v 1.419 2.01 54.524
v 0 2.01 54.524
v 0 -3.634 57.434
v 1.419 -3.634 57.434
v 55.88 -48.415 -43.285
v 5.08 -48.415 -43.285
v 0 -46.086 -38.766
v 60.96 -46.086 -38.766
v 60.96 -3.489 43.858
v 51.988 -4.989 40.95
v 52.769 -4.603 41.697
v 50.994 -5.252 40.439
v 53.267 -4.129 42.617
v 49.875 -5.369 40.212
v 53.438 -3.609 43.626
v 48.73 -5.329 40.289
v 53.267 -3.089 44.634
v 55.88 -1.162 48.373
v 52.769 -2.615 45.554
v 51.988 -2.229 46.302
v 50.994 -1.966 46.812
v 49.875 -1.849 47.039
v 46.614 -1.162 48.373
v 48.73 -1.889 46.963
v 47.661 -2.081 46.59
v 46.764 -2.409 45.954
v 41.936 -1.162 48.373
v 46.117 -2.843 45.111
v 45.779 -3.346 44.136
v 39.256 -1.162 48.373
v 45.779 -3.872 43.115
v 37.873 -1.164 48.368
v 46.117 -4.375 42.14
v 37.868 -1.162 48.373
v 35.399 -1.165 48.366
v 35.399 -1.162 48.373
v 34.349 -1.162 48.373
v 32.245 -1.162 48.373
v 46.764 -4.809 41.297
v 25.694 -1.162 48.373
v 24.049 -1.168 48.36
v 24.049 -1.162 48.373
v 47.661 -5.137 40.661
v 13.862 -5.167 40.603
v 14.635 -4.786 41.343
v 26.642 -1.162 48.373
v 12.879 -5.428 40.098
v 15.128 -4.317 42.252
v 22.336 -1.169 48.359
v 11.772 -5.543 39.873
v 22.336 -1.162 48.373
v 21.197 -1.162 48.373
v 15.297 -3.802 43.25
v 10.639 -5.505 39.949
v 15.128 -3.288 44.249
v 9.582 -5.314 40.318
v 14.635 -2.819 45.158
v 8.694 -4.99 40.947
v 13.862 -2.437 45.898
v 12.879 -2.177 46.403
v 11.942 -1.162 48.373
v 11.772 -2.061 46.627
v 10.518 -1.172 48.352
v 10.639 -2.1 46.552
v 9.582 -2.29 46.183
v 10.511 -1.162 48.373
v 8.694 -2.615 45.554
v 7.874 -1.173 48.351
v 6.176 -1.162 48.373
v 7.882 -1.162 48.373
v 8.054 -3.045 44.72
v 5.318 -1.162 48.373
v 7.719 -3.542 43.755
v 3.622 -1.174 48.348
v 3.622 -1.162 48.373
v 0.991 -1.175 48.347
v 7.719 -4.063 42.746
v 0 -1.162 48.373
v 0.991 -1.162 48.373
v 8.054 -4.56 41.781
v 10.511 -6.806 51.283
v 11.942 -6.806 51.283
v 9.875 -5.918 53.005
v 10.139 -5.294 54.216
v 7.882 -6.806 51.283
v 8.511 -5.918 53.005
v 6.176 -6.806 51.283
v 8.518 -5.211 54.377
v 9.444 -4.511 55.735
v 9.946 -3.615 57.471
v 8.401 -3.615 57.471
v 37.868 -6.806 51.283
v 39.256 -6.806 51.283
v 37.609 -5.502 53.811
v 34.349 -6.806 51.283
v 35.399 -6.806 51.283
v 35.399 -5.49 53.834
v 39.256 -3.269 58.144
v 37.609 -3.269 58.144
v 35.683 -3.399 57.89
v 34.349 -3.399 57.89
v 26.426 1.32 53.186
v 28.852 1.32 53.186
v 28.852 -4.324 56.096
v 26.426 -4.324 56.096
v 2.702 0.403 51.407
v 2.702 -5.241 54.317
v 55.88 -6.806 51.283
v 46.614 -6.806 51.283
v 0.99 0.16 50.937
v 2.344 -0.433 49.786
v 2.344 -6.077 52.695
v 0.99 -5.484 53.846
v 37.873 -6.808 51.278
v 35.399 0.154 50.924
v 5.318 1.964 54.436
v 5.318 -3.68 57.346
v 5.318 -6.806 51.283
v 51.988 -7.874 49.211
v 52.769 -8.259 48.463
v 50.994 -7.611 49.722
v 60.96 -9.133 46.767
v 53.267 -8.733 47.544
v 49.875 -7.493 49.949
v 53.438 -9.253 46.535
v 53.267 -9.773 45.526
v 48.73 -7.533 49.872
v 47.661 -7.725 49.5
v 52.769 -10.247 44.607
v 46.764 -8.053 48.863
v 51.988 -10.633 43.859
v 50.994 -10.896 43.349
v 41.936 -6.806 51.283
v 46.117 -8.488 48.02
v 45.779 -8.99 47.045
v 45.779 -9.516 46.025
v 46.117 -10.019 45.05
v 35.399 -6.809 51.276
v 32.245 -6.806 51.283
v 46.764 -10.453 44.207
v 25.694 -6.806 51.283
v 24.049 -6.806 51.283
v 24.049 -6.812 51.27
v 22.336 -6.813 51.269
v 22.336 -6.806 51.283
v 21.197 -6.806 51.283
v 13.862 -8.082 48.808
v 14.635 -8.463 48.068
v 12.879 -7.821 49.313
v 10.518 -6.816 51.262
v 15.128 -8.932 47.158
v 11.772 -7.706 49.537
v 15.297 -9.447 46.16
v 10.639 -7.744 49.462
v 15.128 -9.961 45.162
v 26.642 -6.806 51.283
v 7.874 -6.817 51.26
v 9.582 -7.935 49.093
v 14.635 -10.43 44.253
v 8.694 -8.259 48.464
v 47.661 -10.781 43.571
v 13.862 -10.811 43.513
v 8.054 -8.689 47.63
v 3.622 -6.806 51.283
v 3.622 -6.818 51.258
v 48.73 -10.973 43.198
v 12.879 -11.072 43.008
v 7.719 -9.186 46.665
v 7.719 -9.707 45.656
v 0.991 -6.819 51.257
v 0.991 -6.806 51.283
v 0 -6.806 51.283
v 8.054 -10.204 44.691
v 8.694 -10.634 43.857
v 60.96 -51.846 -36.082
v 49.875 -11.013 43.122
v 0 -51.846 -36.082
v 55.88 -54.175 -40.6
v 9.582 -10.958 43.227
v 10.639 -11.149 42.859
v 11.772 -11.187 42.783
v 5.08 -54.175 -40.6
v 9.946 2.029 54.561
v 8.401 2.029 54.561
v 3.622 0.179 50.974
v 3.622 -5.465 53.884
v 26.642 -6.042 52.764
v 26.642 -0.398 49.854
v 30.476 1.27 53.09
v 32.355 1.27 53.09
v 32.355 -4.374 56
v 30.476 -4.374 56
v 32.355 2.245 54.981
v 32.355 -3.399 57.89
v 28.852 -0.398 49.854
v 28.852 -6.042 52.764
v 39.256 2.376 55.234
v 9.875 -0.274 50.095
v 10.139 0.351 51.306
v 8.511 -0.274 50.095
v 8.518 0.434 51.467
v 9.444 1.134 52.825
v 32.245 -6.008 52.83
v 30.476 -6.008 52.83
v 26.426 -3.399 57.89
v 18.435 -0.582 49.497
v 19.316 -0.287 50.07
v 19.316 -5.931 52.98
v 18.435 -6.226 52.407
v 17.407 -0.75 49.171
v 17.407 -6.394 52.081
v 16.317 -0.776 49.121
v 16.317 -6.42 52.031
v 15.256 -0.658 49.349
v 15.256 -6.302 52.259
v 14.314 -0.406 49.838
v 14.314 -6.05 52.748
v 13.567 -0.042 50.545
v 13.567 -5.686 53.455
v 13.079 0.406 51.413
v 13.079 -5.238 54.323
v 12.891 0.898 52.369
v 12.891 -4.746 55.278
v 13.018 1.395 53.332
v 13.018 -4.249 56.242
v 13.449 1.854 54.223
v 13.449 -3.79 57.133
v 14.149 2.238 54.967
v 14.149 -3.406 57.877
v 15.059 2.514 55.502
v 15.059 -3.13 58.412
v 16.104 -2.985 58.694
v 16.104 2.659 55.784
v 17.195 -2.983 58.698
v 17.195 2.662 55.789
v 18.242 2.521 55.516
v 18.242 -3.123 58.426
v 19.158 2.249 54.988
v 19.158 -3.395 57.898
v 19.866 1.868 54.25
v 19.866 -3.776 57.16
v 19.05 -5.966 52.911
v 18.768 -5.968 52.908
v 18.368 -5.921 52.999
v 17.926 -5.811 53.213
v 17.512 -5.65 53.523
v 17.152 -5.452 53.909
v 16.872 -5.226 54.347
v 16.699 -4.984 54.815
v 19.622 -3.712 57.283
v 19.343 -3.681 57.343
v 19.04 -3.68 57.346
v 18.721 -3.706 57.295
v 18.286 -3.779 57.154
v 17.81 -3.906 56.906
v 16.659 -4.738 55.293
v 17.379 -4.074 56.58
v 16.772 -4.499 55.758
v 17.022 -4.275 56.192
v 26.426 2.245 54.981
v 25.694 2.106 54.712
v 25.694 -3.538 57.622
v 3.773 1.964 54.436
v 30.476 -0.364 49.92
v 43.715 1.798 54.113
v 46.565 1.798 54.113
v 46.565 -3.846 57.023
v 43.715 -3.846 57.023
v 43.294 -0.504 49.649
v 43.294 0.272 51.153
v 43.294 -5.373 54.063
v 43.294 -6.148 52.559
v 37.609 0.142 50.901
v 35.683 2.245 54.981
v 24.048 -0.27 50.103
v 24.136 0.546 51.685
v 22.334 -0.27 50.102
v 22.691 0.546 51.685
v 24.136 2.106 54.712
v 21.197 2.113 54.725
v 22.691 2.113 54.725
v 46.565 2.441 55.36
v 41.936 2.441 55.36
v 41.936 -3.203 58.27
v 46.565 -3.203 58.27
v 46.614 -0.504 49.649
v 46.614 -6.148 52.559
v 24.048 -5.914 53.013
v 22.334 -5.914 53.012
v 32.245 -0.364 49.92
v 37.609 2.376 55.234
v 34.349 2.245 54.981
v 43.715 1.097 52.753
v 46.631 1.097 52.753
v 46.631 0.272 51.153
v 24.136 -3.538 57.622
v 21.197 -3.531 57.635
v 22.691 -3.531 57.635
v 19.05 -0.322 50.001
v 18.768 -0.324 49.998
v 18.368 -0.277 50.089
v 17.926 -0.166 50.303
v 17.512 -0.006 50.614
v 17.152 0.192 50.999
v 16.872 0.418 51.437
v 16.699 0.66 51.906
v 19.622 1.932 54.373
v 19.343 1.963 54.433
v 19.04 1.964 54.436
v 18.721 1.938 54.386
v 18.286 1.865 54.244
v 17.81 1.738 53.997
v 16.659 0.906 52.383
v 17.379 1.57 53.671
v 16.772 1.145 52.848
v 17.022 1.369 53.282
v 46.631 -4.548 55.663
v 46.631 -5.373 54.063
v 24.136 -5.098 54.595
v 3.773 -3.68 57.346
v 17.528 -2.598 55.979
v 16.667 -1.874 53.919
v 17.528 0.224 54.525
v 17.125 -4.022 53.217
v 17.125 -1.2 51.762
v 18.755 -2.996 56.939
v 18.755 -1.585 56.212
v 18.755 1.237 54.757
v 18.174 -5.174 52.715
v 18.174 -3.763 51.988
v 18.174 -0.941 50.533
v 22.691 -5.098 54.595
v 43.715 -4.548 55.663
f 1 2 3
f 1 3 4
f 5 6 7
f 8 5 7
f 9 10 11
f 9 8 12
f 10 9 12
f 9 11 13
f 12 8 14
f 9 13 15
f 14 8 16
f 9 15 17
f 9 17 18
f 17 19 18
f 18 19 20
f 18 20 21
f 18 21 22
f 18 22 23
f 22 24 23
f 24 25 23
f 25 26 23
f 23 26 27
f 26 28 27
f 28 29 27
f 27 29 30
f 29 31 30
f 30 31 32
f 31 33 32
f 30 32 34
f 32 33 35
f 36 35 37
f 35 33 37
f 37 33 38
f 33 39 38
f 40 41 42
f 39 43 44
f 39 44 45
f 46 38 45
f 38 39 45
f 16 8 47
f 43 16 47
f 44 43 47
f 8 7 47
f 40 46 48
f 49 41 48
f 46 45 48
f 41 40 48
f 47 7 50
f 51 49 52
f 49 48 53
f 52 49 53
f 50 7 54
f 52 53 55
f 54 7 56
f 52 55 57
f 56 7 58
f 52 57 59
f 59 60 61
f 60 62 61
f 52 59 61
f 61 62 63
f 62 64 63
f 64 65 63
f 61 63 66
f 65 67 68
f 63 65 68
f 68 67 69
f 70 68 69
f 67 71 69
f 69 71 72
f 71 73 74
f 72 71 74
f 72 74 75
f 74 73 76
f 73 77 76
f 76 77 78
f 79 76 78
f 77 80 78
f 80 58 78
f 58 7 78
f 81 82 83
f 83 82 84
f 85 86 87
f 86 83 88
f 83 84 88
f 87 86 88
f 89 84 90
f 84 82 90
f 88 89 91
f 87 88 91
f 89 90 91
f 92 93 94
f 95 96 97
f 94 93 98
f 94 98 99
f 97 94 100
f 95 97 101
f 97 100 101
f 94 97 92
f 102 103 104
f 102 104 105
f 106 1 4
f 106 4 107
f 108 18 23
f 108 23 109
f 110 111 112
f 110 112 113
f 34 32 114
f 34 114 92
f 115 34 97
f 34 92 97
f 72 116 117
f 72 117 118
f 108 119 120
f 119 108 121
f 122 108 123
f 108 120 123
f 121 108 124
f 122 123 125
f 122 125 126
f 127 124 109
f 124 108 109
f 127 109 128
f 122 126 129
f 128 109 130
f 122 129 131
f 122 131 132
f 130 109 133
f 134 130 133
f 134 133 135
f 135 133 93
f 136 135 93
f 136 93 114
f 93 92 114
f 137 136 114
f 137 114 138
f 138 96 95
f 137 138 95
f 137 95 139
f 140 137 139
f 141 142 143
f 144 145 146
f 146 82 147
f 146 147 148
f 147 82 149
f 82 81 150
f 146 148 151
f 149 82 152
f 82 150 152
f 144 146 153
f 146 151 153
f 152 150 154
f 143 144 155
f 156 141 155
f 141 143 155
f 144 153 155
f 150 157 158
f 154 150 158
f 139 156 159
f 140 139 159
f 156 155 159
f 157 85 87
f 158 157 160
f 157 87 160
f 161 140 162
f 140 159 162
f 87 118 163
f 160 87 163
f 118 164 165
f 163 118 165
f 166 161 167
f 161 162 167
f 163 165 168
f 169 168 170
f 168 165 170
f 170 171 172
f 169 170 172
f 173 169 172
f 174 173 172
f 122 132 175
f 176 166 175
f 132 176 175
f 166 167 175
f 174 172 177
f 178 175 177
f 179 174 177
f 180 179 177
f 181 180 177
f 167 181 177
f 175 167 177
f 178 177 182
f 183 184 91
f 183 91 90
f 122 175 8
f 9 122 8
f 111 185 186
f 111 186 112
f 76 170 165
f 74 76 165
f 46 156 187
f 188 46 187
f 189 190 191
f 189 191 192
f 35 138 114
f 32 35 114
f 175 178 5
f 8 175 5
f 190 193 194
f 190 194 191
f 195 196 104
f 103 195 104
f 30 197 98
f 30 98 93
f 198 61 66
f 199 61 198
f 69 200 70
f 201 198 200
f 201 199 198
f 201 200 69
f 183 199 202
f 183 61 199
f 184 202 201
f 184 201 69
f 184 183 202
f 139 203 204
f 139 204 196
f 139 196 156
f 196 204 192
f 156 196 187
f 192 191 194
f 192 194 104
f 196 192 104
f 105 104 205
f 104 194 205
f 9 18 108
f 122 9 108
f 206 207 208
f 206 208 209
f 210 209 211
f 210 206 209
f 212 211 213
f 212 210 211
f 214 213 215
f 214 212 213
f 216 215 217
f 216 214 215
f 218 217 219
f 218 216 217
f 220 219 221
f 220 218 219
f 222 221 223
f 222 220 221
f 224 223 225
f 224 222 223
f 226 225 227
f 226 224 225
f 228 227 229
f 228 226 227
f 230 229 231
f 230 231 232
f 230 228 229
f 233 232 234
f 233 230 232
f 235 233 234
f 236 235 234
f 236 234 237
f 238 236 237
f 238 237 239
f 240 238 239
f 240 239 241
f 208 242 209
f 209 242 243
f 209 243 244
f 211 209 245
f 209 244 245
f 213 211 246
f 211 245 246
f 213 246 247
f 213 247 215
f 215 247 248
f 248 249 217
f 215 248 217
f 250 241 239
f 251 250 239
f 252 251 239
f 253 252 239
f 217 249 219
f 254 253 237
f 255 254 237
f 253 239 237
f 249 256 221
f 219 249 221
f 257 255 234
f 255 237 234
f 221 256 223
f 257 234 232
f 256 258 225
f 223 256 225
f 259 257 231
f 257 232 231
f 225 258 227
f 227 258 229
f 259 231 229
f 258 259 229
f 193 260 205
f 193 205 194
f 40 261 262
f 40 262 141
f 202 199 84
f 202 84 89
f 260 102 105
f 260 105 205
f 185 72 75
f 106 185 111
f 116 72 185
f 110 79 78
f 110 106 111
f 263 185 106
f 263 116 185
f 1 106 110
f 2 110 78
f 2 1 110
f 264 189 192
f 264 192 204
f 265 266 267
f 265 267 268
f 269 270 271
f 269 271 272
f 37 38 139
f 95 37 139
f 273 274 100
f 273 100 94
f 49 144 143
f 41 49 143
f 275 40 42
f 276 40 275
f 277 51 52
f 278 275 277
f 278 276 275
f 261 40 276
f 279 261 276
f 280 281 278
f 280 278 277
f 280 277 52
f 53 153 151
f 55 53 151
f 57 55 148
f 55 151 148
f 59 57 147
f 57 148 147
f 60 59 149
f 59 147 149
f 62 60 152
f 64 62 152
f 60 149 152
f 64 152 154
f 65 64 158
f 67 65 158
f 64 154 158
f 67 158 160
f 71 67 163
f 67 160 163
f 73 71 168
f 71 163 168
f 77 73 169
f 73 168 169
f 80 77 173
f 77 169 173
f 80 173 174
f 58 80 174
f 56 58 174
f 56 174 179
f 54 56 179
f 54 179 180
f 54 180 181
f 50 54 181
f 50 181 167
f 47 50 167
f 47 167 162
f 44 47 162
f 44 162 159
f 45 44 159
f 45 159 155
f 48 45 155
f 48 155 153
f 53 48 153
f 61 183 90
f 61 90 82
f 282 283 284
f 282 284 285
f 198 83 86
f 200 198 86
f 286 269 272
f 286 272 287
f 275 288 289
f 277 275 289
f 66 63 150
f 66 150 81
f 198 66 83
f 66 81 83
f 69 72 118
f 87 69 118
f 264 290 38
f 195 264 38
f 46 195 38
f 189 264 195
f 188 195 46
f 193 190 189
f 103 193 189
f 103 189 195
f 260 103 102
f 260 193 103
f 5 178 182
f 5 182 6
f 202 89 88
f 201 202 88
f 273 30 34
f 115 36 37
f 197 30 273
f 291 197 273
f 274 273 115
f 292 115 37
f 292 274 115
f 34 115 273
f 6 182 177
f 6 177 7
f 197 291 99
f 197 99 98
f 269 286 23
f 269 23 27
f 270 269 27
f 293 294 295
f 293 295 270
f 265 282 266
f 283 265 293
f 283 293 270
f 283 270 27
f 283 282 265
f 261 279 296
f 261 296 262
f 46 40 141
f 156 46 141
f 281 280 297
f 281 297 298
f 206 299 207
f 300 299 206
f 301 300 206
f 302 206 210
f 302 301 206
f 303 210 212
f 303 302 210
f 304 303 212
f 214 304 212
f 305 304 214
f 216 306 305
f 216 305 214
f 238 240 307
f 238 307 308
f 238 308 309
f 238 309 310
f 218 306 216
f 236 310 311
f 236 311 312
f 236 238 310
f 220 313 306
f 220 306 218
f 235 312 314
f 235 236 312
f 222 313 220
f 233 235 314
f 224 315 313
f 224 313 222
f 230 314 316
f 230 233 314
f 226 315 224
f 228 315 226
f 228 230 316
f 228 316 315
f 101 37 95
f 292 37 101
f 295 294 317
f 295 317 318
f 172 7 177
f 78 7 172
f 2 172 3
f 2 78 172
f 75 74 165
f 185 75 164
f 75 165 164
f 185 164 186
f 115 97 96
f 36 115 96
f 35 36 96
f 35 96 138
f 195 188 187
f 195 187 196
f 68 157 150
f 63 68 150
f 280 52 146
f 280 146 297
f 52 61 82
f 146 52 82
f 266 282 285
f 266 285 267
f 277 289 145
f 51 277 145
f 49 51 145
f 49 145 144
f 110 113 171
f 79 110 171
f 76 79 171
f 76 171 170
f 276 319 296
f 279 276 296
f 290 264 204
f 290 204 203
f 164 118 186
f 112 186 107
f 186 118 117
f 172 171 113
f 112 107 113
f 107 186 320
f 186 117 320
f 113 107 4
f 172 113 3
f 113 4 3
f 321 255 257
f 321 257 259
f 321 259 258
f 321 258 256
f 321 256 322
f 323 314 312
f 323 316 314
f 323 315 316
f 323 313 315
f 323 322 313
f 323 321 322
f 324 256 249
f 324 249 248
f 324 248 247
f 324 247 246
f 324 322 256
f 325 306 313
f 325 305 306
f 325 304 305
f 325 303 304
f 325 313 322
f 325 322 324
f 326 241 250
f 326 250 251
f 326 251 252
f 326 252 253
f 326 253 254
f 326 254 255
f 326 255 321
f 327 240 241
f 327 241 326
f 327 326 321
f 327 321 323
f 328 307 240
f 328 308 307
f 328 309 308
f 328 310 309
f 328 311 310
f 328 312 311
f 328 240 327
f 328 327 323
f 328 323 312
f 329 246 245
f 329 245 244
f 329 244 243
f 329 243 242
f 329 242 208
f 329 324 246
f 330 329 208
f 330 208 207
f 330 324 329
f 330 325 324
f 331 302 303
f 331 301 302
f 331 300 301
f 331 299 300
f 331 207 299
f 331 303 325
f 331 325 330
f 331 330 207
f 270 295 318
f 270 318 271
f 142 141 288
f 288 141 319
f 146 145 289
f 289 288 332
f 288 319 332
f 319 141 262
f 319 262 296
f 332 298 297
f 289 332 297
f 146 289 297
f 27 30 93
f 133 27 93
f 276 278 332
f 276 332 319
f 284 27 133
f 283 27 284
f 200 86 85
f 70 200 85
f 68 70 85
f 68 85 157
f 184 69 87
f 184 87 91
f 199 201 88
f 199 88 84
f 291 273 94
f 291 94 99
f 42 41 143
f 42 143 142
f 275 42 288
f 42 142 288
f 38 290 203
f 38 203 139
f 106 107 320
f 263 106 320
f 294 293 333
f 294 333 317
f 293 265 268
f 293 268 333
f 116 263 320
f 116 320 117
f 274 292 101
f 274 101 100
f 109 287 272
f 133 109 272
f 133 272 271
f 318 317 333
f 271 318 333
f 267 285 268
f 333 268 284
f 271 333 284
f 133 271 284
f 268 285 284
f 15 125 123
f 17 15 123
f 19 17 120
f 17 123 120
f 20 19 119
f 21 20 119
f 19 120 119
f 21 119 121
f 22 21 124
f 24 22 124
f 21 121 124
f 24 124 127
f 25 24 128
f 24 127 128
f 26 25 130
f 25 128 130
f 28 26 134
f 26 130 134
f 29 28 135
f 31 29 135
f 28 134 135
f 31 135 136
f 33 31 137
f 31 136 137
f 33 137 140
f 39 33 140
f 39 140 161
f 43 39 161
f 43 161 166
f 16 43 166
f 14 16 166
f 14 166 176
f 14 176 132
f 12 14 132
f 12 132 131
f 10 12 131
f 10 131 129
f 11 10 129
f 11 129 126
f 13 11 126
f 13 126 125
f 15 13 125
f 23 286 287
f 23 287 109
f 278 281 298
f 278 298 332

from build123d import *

# Parameters (mm, degrees)
F1_DEPTH = 60.96
F2_R     = 3.81
F2_R_2   = 3.8508677483
F3_DEPTH = 25.4
F5_DEPTH = 6.35
F7_DEPTH = 25.4
F8_SIZE  = 5.08


with BuildPart() as f1:
    # F0 (on Right) → F1 (new body)
    with BuildSketch(Plane.YZ):
        Polygon((-48.4152159798, -43.2849022093), (-1.161592304, 48.3728786074), (-6.805678506, 51.2826536751), (-54.1754523457, -40.600423435), align=None)
    extrude(amount=F1_DEPTH)

    # F2 (on face) → F3 (cut)
    with BuildSketch(Plane(origin=(0, -26.263645076, 13.5400659902), x_dir=(1, 0, 0), z_dir=(0, -0.8888324728, 0.4582322941))):
        with Locations((11.4869037643, 36.7000326514)):
            Circle(F2_R)
        with Locations((49.5869037643, 37.1220372617)):
            Circle(F2_R_2)
    extrude(amount=-F3_DEPTH, mode=Mode.SUBTRACT)

    # F4 (on face) → F5 (join)
    with BuildSketch(Plane(origin=(0, -20.619558874, 10.6302909225), x_dir=(-1, 0, 0), z_dir=(0, 0.8888324728, -0.4582322941))):
        Polygon((-5.3176167421, 42.4631062004), (0, 42.4631062004), (0, 49.383803788), (-1.4188548084, 49.383803788), (-2.7015644591, 45.8769905897), (-3.7731891498, 49.2842938335), (-5.3176167421, 49.2842938335), align=None)
        Polygon((-11.942232959, 42.4631062004), (-6.1762407422, 42.4631062004), (-8.4014460444, 49.4251023562), (-9.9458741024, 49.4251023562), align=None)
        Polygon((-25.6943982095, 42.4631062004), (-21.1968142539, 42.4631062004), (-21.1968142539, 49.6102381082), (-22.6909797639, 49.6102381082), (-22.6909797639, 46.1899932058), (-24.135671556, 46.1899932058), (-24.135671556, 49.5950202973), (-25.6943982095, 49.5950202973), align=None)
        Polygon((-46.6139614582, 43.8990030022), (-46.6139614582, 42.4631062004), (-41.936211288, 42.4631062004), (-41.936211288, 50.3241378398), (-46.5652421117, 50.3241378398), (-46.5652421117, 48.9213052721), (-43.7149144709, 48.9213052721), (-43.7149144709, 47.3909783693), (-46.6309636831, 47.3909783693), (-46.6309636831, 45.5906685026), (-43.2935357094, 45.5906685026), (-43.2935357094, 43.8990030022), align=None)
        Polygon((-32.2451777756, 42.4631062004), (-26.6419369727, 42.4631062004), (-26.6419369727, 44.1295947464), (-28.852455318, 44.1295947464), (-28.852455318, 47.8782388897), (-26.4258272946, 47.8782388897), (-26.4258272946, 49.8971711429), (-29.0248729289, 49.8971711429), (-32.3545746505, 49.8971711429), (-32.3545746505, 47.7699819537), (-30.4757487029, 47.7699819537), (-30.4757487029, 44.2036125393), (-32.2451777756, 44.2036125393), align=None)
        Polygon((-39.2559804022, 50.1821931036), (-39.2559804022, 42.4631062004), (-34.3486145139, 42.4631062004), (-34.3486145139, 49.8971711429), (-35.6831140816, 49.8971711429), (-37.6087278128, 45.307162735), (-37.6087278128, 50.1821931036), align=None)
    extrude(amount=-F5_DEPTH)

    # F6 (on face) → F7 (cut)
    with BuildSketch(Plane(origin=(0, -26.263645076, 13.5400659902), x_dir=(1, 0, 0), z_dir=(0, -0.8888324728, 0.4582322941))):
        Polygon((0.9895682648, 45.3476009629), (0.9914431559, 42.433750795), (3.6224654218, 42.435443703), (3.6224654218, 45.3893982965), (2.3443866521, 44.0524443984), align=None)
        Polygon((35.3990507247, 45.3338064253), (35.3990507247, 42.4558900654), (37.8731534896, 42.457482005), align=None)
        Polygon((22.3342671491, 44.4084667024), (22.3355289257, 42.447484458), (24.0494933407, 42.4485872932), (24.048231564, 44.4095695376), align=None)
        Polygon((8.5106072947, 44.4005616009), (7.8737791451, 42.4381791732), (10.5184626663, 42.4398808714), (9.8749566823, 44.4005616009), align=None)
        Polygon((10.1390406489, 45.7629784942), (9.4444689872, 47.4718217689), (8.5177887231, 45.9441042783), align=None)
    extrude(amount=-F7_DEPTH, mode=Mode.SUBTRACT)

    # F8
    f8_edges = [f1.edges().sort_by_distance(p)[0] for p in [
        (60.96, -3.983635, 49.827766),
        (60.96, -51.295334, -41.942663),
        (0, -51.295334, -41.942663),
    ]]
    chamfer(f8_edges, length=F8_SIZE)


with BuildPart() as f5:
    # F4 (on face) → F5, piece 2 (new body)
    with BuildSketch(Plane(origin=(0, -20.619558874, 10.6302909225), x_dir=(-1, 0, 0), z_dir=(0, 0.8888324728, -0.4582322941))):
        with BuildLine():
            add(Edge.make_bspline(
                [(-19.8659427695, 49.0752757694), (-18.9275712513, 49.8099196351), (-14.7540508214, 47.2898812626), (-18.2328673452, 43.8742258683), (-19.3155179804, 44.3723326013)],
                knots=[0, 0, 0, 0, 0.3205550369, 0.6411100737, 0.6411100737, 0.6411100737, 0.6411100737], degree=3))
            ThreePointArc((-19.3155179804, 44.3723326013), (-12.9152251226, 47.5050944198), (-19.8659427695, 49.0752757694))
        make_face()
    extrude(amount=-F5_DEPTH)


solid = Compound([f1.part, f5.part])
